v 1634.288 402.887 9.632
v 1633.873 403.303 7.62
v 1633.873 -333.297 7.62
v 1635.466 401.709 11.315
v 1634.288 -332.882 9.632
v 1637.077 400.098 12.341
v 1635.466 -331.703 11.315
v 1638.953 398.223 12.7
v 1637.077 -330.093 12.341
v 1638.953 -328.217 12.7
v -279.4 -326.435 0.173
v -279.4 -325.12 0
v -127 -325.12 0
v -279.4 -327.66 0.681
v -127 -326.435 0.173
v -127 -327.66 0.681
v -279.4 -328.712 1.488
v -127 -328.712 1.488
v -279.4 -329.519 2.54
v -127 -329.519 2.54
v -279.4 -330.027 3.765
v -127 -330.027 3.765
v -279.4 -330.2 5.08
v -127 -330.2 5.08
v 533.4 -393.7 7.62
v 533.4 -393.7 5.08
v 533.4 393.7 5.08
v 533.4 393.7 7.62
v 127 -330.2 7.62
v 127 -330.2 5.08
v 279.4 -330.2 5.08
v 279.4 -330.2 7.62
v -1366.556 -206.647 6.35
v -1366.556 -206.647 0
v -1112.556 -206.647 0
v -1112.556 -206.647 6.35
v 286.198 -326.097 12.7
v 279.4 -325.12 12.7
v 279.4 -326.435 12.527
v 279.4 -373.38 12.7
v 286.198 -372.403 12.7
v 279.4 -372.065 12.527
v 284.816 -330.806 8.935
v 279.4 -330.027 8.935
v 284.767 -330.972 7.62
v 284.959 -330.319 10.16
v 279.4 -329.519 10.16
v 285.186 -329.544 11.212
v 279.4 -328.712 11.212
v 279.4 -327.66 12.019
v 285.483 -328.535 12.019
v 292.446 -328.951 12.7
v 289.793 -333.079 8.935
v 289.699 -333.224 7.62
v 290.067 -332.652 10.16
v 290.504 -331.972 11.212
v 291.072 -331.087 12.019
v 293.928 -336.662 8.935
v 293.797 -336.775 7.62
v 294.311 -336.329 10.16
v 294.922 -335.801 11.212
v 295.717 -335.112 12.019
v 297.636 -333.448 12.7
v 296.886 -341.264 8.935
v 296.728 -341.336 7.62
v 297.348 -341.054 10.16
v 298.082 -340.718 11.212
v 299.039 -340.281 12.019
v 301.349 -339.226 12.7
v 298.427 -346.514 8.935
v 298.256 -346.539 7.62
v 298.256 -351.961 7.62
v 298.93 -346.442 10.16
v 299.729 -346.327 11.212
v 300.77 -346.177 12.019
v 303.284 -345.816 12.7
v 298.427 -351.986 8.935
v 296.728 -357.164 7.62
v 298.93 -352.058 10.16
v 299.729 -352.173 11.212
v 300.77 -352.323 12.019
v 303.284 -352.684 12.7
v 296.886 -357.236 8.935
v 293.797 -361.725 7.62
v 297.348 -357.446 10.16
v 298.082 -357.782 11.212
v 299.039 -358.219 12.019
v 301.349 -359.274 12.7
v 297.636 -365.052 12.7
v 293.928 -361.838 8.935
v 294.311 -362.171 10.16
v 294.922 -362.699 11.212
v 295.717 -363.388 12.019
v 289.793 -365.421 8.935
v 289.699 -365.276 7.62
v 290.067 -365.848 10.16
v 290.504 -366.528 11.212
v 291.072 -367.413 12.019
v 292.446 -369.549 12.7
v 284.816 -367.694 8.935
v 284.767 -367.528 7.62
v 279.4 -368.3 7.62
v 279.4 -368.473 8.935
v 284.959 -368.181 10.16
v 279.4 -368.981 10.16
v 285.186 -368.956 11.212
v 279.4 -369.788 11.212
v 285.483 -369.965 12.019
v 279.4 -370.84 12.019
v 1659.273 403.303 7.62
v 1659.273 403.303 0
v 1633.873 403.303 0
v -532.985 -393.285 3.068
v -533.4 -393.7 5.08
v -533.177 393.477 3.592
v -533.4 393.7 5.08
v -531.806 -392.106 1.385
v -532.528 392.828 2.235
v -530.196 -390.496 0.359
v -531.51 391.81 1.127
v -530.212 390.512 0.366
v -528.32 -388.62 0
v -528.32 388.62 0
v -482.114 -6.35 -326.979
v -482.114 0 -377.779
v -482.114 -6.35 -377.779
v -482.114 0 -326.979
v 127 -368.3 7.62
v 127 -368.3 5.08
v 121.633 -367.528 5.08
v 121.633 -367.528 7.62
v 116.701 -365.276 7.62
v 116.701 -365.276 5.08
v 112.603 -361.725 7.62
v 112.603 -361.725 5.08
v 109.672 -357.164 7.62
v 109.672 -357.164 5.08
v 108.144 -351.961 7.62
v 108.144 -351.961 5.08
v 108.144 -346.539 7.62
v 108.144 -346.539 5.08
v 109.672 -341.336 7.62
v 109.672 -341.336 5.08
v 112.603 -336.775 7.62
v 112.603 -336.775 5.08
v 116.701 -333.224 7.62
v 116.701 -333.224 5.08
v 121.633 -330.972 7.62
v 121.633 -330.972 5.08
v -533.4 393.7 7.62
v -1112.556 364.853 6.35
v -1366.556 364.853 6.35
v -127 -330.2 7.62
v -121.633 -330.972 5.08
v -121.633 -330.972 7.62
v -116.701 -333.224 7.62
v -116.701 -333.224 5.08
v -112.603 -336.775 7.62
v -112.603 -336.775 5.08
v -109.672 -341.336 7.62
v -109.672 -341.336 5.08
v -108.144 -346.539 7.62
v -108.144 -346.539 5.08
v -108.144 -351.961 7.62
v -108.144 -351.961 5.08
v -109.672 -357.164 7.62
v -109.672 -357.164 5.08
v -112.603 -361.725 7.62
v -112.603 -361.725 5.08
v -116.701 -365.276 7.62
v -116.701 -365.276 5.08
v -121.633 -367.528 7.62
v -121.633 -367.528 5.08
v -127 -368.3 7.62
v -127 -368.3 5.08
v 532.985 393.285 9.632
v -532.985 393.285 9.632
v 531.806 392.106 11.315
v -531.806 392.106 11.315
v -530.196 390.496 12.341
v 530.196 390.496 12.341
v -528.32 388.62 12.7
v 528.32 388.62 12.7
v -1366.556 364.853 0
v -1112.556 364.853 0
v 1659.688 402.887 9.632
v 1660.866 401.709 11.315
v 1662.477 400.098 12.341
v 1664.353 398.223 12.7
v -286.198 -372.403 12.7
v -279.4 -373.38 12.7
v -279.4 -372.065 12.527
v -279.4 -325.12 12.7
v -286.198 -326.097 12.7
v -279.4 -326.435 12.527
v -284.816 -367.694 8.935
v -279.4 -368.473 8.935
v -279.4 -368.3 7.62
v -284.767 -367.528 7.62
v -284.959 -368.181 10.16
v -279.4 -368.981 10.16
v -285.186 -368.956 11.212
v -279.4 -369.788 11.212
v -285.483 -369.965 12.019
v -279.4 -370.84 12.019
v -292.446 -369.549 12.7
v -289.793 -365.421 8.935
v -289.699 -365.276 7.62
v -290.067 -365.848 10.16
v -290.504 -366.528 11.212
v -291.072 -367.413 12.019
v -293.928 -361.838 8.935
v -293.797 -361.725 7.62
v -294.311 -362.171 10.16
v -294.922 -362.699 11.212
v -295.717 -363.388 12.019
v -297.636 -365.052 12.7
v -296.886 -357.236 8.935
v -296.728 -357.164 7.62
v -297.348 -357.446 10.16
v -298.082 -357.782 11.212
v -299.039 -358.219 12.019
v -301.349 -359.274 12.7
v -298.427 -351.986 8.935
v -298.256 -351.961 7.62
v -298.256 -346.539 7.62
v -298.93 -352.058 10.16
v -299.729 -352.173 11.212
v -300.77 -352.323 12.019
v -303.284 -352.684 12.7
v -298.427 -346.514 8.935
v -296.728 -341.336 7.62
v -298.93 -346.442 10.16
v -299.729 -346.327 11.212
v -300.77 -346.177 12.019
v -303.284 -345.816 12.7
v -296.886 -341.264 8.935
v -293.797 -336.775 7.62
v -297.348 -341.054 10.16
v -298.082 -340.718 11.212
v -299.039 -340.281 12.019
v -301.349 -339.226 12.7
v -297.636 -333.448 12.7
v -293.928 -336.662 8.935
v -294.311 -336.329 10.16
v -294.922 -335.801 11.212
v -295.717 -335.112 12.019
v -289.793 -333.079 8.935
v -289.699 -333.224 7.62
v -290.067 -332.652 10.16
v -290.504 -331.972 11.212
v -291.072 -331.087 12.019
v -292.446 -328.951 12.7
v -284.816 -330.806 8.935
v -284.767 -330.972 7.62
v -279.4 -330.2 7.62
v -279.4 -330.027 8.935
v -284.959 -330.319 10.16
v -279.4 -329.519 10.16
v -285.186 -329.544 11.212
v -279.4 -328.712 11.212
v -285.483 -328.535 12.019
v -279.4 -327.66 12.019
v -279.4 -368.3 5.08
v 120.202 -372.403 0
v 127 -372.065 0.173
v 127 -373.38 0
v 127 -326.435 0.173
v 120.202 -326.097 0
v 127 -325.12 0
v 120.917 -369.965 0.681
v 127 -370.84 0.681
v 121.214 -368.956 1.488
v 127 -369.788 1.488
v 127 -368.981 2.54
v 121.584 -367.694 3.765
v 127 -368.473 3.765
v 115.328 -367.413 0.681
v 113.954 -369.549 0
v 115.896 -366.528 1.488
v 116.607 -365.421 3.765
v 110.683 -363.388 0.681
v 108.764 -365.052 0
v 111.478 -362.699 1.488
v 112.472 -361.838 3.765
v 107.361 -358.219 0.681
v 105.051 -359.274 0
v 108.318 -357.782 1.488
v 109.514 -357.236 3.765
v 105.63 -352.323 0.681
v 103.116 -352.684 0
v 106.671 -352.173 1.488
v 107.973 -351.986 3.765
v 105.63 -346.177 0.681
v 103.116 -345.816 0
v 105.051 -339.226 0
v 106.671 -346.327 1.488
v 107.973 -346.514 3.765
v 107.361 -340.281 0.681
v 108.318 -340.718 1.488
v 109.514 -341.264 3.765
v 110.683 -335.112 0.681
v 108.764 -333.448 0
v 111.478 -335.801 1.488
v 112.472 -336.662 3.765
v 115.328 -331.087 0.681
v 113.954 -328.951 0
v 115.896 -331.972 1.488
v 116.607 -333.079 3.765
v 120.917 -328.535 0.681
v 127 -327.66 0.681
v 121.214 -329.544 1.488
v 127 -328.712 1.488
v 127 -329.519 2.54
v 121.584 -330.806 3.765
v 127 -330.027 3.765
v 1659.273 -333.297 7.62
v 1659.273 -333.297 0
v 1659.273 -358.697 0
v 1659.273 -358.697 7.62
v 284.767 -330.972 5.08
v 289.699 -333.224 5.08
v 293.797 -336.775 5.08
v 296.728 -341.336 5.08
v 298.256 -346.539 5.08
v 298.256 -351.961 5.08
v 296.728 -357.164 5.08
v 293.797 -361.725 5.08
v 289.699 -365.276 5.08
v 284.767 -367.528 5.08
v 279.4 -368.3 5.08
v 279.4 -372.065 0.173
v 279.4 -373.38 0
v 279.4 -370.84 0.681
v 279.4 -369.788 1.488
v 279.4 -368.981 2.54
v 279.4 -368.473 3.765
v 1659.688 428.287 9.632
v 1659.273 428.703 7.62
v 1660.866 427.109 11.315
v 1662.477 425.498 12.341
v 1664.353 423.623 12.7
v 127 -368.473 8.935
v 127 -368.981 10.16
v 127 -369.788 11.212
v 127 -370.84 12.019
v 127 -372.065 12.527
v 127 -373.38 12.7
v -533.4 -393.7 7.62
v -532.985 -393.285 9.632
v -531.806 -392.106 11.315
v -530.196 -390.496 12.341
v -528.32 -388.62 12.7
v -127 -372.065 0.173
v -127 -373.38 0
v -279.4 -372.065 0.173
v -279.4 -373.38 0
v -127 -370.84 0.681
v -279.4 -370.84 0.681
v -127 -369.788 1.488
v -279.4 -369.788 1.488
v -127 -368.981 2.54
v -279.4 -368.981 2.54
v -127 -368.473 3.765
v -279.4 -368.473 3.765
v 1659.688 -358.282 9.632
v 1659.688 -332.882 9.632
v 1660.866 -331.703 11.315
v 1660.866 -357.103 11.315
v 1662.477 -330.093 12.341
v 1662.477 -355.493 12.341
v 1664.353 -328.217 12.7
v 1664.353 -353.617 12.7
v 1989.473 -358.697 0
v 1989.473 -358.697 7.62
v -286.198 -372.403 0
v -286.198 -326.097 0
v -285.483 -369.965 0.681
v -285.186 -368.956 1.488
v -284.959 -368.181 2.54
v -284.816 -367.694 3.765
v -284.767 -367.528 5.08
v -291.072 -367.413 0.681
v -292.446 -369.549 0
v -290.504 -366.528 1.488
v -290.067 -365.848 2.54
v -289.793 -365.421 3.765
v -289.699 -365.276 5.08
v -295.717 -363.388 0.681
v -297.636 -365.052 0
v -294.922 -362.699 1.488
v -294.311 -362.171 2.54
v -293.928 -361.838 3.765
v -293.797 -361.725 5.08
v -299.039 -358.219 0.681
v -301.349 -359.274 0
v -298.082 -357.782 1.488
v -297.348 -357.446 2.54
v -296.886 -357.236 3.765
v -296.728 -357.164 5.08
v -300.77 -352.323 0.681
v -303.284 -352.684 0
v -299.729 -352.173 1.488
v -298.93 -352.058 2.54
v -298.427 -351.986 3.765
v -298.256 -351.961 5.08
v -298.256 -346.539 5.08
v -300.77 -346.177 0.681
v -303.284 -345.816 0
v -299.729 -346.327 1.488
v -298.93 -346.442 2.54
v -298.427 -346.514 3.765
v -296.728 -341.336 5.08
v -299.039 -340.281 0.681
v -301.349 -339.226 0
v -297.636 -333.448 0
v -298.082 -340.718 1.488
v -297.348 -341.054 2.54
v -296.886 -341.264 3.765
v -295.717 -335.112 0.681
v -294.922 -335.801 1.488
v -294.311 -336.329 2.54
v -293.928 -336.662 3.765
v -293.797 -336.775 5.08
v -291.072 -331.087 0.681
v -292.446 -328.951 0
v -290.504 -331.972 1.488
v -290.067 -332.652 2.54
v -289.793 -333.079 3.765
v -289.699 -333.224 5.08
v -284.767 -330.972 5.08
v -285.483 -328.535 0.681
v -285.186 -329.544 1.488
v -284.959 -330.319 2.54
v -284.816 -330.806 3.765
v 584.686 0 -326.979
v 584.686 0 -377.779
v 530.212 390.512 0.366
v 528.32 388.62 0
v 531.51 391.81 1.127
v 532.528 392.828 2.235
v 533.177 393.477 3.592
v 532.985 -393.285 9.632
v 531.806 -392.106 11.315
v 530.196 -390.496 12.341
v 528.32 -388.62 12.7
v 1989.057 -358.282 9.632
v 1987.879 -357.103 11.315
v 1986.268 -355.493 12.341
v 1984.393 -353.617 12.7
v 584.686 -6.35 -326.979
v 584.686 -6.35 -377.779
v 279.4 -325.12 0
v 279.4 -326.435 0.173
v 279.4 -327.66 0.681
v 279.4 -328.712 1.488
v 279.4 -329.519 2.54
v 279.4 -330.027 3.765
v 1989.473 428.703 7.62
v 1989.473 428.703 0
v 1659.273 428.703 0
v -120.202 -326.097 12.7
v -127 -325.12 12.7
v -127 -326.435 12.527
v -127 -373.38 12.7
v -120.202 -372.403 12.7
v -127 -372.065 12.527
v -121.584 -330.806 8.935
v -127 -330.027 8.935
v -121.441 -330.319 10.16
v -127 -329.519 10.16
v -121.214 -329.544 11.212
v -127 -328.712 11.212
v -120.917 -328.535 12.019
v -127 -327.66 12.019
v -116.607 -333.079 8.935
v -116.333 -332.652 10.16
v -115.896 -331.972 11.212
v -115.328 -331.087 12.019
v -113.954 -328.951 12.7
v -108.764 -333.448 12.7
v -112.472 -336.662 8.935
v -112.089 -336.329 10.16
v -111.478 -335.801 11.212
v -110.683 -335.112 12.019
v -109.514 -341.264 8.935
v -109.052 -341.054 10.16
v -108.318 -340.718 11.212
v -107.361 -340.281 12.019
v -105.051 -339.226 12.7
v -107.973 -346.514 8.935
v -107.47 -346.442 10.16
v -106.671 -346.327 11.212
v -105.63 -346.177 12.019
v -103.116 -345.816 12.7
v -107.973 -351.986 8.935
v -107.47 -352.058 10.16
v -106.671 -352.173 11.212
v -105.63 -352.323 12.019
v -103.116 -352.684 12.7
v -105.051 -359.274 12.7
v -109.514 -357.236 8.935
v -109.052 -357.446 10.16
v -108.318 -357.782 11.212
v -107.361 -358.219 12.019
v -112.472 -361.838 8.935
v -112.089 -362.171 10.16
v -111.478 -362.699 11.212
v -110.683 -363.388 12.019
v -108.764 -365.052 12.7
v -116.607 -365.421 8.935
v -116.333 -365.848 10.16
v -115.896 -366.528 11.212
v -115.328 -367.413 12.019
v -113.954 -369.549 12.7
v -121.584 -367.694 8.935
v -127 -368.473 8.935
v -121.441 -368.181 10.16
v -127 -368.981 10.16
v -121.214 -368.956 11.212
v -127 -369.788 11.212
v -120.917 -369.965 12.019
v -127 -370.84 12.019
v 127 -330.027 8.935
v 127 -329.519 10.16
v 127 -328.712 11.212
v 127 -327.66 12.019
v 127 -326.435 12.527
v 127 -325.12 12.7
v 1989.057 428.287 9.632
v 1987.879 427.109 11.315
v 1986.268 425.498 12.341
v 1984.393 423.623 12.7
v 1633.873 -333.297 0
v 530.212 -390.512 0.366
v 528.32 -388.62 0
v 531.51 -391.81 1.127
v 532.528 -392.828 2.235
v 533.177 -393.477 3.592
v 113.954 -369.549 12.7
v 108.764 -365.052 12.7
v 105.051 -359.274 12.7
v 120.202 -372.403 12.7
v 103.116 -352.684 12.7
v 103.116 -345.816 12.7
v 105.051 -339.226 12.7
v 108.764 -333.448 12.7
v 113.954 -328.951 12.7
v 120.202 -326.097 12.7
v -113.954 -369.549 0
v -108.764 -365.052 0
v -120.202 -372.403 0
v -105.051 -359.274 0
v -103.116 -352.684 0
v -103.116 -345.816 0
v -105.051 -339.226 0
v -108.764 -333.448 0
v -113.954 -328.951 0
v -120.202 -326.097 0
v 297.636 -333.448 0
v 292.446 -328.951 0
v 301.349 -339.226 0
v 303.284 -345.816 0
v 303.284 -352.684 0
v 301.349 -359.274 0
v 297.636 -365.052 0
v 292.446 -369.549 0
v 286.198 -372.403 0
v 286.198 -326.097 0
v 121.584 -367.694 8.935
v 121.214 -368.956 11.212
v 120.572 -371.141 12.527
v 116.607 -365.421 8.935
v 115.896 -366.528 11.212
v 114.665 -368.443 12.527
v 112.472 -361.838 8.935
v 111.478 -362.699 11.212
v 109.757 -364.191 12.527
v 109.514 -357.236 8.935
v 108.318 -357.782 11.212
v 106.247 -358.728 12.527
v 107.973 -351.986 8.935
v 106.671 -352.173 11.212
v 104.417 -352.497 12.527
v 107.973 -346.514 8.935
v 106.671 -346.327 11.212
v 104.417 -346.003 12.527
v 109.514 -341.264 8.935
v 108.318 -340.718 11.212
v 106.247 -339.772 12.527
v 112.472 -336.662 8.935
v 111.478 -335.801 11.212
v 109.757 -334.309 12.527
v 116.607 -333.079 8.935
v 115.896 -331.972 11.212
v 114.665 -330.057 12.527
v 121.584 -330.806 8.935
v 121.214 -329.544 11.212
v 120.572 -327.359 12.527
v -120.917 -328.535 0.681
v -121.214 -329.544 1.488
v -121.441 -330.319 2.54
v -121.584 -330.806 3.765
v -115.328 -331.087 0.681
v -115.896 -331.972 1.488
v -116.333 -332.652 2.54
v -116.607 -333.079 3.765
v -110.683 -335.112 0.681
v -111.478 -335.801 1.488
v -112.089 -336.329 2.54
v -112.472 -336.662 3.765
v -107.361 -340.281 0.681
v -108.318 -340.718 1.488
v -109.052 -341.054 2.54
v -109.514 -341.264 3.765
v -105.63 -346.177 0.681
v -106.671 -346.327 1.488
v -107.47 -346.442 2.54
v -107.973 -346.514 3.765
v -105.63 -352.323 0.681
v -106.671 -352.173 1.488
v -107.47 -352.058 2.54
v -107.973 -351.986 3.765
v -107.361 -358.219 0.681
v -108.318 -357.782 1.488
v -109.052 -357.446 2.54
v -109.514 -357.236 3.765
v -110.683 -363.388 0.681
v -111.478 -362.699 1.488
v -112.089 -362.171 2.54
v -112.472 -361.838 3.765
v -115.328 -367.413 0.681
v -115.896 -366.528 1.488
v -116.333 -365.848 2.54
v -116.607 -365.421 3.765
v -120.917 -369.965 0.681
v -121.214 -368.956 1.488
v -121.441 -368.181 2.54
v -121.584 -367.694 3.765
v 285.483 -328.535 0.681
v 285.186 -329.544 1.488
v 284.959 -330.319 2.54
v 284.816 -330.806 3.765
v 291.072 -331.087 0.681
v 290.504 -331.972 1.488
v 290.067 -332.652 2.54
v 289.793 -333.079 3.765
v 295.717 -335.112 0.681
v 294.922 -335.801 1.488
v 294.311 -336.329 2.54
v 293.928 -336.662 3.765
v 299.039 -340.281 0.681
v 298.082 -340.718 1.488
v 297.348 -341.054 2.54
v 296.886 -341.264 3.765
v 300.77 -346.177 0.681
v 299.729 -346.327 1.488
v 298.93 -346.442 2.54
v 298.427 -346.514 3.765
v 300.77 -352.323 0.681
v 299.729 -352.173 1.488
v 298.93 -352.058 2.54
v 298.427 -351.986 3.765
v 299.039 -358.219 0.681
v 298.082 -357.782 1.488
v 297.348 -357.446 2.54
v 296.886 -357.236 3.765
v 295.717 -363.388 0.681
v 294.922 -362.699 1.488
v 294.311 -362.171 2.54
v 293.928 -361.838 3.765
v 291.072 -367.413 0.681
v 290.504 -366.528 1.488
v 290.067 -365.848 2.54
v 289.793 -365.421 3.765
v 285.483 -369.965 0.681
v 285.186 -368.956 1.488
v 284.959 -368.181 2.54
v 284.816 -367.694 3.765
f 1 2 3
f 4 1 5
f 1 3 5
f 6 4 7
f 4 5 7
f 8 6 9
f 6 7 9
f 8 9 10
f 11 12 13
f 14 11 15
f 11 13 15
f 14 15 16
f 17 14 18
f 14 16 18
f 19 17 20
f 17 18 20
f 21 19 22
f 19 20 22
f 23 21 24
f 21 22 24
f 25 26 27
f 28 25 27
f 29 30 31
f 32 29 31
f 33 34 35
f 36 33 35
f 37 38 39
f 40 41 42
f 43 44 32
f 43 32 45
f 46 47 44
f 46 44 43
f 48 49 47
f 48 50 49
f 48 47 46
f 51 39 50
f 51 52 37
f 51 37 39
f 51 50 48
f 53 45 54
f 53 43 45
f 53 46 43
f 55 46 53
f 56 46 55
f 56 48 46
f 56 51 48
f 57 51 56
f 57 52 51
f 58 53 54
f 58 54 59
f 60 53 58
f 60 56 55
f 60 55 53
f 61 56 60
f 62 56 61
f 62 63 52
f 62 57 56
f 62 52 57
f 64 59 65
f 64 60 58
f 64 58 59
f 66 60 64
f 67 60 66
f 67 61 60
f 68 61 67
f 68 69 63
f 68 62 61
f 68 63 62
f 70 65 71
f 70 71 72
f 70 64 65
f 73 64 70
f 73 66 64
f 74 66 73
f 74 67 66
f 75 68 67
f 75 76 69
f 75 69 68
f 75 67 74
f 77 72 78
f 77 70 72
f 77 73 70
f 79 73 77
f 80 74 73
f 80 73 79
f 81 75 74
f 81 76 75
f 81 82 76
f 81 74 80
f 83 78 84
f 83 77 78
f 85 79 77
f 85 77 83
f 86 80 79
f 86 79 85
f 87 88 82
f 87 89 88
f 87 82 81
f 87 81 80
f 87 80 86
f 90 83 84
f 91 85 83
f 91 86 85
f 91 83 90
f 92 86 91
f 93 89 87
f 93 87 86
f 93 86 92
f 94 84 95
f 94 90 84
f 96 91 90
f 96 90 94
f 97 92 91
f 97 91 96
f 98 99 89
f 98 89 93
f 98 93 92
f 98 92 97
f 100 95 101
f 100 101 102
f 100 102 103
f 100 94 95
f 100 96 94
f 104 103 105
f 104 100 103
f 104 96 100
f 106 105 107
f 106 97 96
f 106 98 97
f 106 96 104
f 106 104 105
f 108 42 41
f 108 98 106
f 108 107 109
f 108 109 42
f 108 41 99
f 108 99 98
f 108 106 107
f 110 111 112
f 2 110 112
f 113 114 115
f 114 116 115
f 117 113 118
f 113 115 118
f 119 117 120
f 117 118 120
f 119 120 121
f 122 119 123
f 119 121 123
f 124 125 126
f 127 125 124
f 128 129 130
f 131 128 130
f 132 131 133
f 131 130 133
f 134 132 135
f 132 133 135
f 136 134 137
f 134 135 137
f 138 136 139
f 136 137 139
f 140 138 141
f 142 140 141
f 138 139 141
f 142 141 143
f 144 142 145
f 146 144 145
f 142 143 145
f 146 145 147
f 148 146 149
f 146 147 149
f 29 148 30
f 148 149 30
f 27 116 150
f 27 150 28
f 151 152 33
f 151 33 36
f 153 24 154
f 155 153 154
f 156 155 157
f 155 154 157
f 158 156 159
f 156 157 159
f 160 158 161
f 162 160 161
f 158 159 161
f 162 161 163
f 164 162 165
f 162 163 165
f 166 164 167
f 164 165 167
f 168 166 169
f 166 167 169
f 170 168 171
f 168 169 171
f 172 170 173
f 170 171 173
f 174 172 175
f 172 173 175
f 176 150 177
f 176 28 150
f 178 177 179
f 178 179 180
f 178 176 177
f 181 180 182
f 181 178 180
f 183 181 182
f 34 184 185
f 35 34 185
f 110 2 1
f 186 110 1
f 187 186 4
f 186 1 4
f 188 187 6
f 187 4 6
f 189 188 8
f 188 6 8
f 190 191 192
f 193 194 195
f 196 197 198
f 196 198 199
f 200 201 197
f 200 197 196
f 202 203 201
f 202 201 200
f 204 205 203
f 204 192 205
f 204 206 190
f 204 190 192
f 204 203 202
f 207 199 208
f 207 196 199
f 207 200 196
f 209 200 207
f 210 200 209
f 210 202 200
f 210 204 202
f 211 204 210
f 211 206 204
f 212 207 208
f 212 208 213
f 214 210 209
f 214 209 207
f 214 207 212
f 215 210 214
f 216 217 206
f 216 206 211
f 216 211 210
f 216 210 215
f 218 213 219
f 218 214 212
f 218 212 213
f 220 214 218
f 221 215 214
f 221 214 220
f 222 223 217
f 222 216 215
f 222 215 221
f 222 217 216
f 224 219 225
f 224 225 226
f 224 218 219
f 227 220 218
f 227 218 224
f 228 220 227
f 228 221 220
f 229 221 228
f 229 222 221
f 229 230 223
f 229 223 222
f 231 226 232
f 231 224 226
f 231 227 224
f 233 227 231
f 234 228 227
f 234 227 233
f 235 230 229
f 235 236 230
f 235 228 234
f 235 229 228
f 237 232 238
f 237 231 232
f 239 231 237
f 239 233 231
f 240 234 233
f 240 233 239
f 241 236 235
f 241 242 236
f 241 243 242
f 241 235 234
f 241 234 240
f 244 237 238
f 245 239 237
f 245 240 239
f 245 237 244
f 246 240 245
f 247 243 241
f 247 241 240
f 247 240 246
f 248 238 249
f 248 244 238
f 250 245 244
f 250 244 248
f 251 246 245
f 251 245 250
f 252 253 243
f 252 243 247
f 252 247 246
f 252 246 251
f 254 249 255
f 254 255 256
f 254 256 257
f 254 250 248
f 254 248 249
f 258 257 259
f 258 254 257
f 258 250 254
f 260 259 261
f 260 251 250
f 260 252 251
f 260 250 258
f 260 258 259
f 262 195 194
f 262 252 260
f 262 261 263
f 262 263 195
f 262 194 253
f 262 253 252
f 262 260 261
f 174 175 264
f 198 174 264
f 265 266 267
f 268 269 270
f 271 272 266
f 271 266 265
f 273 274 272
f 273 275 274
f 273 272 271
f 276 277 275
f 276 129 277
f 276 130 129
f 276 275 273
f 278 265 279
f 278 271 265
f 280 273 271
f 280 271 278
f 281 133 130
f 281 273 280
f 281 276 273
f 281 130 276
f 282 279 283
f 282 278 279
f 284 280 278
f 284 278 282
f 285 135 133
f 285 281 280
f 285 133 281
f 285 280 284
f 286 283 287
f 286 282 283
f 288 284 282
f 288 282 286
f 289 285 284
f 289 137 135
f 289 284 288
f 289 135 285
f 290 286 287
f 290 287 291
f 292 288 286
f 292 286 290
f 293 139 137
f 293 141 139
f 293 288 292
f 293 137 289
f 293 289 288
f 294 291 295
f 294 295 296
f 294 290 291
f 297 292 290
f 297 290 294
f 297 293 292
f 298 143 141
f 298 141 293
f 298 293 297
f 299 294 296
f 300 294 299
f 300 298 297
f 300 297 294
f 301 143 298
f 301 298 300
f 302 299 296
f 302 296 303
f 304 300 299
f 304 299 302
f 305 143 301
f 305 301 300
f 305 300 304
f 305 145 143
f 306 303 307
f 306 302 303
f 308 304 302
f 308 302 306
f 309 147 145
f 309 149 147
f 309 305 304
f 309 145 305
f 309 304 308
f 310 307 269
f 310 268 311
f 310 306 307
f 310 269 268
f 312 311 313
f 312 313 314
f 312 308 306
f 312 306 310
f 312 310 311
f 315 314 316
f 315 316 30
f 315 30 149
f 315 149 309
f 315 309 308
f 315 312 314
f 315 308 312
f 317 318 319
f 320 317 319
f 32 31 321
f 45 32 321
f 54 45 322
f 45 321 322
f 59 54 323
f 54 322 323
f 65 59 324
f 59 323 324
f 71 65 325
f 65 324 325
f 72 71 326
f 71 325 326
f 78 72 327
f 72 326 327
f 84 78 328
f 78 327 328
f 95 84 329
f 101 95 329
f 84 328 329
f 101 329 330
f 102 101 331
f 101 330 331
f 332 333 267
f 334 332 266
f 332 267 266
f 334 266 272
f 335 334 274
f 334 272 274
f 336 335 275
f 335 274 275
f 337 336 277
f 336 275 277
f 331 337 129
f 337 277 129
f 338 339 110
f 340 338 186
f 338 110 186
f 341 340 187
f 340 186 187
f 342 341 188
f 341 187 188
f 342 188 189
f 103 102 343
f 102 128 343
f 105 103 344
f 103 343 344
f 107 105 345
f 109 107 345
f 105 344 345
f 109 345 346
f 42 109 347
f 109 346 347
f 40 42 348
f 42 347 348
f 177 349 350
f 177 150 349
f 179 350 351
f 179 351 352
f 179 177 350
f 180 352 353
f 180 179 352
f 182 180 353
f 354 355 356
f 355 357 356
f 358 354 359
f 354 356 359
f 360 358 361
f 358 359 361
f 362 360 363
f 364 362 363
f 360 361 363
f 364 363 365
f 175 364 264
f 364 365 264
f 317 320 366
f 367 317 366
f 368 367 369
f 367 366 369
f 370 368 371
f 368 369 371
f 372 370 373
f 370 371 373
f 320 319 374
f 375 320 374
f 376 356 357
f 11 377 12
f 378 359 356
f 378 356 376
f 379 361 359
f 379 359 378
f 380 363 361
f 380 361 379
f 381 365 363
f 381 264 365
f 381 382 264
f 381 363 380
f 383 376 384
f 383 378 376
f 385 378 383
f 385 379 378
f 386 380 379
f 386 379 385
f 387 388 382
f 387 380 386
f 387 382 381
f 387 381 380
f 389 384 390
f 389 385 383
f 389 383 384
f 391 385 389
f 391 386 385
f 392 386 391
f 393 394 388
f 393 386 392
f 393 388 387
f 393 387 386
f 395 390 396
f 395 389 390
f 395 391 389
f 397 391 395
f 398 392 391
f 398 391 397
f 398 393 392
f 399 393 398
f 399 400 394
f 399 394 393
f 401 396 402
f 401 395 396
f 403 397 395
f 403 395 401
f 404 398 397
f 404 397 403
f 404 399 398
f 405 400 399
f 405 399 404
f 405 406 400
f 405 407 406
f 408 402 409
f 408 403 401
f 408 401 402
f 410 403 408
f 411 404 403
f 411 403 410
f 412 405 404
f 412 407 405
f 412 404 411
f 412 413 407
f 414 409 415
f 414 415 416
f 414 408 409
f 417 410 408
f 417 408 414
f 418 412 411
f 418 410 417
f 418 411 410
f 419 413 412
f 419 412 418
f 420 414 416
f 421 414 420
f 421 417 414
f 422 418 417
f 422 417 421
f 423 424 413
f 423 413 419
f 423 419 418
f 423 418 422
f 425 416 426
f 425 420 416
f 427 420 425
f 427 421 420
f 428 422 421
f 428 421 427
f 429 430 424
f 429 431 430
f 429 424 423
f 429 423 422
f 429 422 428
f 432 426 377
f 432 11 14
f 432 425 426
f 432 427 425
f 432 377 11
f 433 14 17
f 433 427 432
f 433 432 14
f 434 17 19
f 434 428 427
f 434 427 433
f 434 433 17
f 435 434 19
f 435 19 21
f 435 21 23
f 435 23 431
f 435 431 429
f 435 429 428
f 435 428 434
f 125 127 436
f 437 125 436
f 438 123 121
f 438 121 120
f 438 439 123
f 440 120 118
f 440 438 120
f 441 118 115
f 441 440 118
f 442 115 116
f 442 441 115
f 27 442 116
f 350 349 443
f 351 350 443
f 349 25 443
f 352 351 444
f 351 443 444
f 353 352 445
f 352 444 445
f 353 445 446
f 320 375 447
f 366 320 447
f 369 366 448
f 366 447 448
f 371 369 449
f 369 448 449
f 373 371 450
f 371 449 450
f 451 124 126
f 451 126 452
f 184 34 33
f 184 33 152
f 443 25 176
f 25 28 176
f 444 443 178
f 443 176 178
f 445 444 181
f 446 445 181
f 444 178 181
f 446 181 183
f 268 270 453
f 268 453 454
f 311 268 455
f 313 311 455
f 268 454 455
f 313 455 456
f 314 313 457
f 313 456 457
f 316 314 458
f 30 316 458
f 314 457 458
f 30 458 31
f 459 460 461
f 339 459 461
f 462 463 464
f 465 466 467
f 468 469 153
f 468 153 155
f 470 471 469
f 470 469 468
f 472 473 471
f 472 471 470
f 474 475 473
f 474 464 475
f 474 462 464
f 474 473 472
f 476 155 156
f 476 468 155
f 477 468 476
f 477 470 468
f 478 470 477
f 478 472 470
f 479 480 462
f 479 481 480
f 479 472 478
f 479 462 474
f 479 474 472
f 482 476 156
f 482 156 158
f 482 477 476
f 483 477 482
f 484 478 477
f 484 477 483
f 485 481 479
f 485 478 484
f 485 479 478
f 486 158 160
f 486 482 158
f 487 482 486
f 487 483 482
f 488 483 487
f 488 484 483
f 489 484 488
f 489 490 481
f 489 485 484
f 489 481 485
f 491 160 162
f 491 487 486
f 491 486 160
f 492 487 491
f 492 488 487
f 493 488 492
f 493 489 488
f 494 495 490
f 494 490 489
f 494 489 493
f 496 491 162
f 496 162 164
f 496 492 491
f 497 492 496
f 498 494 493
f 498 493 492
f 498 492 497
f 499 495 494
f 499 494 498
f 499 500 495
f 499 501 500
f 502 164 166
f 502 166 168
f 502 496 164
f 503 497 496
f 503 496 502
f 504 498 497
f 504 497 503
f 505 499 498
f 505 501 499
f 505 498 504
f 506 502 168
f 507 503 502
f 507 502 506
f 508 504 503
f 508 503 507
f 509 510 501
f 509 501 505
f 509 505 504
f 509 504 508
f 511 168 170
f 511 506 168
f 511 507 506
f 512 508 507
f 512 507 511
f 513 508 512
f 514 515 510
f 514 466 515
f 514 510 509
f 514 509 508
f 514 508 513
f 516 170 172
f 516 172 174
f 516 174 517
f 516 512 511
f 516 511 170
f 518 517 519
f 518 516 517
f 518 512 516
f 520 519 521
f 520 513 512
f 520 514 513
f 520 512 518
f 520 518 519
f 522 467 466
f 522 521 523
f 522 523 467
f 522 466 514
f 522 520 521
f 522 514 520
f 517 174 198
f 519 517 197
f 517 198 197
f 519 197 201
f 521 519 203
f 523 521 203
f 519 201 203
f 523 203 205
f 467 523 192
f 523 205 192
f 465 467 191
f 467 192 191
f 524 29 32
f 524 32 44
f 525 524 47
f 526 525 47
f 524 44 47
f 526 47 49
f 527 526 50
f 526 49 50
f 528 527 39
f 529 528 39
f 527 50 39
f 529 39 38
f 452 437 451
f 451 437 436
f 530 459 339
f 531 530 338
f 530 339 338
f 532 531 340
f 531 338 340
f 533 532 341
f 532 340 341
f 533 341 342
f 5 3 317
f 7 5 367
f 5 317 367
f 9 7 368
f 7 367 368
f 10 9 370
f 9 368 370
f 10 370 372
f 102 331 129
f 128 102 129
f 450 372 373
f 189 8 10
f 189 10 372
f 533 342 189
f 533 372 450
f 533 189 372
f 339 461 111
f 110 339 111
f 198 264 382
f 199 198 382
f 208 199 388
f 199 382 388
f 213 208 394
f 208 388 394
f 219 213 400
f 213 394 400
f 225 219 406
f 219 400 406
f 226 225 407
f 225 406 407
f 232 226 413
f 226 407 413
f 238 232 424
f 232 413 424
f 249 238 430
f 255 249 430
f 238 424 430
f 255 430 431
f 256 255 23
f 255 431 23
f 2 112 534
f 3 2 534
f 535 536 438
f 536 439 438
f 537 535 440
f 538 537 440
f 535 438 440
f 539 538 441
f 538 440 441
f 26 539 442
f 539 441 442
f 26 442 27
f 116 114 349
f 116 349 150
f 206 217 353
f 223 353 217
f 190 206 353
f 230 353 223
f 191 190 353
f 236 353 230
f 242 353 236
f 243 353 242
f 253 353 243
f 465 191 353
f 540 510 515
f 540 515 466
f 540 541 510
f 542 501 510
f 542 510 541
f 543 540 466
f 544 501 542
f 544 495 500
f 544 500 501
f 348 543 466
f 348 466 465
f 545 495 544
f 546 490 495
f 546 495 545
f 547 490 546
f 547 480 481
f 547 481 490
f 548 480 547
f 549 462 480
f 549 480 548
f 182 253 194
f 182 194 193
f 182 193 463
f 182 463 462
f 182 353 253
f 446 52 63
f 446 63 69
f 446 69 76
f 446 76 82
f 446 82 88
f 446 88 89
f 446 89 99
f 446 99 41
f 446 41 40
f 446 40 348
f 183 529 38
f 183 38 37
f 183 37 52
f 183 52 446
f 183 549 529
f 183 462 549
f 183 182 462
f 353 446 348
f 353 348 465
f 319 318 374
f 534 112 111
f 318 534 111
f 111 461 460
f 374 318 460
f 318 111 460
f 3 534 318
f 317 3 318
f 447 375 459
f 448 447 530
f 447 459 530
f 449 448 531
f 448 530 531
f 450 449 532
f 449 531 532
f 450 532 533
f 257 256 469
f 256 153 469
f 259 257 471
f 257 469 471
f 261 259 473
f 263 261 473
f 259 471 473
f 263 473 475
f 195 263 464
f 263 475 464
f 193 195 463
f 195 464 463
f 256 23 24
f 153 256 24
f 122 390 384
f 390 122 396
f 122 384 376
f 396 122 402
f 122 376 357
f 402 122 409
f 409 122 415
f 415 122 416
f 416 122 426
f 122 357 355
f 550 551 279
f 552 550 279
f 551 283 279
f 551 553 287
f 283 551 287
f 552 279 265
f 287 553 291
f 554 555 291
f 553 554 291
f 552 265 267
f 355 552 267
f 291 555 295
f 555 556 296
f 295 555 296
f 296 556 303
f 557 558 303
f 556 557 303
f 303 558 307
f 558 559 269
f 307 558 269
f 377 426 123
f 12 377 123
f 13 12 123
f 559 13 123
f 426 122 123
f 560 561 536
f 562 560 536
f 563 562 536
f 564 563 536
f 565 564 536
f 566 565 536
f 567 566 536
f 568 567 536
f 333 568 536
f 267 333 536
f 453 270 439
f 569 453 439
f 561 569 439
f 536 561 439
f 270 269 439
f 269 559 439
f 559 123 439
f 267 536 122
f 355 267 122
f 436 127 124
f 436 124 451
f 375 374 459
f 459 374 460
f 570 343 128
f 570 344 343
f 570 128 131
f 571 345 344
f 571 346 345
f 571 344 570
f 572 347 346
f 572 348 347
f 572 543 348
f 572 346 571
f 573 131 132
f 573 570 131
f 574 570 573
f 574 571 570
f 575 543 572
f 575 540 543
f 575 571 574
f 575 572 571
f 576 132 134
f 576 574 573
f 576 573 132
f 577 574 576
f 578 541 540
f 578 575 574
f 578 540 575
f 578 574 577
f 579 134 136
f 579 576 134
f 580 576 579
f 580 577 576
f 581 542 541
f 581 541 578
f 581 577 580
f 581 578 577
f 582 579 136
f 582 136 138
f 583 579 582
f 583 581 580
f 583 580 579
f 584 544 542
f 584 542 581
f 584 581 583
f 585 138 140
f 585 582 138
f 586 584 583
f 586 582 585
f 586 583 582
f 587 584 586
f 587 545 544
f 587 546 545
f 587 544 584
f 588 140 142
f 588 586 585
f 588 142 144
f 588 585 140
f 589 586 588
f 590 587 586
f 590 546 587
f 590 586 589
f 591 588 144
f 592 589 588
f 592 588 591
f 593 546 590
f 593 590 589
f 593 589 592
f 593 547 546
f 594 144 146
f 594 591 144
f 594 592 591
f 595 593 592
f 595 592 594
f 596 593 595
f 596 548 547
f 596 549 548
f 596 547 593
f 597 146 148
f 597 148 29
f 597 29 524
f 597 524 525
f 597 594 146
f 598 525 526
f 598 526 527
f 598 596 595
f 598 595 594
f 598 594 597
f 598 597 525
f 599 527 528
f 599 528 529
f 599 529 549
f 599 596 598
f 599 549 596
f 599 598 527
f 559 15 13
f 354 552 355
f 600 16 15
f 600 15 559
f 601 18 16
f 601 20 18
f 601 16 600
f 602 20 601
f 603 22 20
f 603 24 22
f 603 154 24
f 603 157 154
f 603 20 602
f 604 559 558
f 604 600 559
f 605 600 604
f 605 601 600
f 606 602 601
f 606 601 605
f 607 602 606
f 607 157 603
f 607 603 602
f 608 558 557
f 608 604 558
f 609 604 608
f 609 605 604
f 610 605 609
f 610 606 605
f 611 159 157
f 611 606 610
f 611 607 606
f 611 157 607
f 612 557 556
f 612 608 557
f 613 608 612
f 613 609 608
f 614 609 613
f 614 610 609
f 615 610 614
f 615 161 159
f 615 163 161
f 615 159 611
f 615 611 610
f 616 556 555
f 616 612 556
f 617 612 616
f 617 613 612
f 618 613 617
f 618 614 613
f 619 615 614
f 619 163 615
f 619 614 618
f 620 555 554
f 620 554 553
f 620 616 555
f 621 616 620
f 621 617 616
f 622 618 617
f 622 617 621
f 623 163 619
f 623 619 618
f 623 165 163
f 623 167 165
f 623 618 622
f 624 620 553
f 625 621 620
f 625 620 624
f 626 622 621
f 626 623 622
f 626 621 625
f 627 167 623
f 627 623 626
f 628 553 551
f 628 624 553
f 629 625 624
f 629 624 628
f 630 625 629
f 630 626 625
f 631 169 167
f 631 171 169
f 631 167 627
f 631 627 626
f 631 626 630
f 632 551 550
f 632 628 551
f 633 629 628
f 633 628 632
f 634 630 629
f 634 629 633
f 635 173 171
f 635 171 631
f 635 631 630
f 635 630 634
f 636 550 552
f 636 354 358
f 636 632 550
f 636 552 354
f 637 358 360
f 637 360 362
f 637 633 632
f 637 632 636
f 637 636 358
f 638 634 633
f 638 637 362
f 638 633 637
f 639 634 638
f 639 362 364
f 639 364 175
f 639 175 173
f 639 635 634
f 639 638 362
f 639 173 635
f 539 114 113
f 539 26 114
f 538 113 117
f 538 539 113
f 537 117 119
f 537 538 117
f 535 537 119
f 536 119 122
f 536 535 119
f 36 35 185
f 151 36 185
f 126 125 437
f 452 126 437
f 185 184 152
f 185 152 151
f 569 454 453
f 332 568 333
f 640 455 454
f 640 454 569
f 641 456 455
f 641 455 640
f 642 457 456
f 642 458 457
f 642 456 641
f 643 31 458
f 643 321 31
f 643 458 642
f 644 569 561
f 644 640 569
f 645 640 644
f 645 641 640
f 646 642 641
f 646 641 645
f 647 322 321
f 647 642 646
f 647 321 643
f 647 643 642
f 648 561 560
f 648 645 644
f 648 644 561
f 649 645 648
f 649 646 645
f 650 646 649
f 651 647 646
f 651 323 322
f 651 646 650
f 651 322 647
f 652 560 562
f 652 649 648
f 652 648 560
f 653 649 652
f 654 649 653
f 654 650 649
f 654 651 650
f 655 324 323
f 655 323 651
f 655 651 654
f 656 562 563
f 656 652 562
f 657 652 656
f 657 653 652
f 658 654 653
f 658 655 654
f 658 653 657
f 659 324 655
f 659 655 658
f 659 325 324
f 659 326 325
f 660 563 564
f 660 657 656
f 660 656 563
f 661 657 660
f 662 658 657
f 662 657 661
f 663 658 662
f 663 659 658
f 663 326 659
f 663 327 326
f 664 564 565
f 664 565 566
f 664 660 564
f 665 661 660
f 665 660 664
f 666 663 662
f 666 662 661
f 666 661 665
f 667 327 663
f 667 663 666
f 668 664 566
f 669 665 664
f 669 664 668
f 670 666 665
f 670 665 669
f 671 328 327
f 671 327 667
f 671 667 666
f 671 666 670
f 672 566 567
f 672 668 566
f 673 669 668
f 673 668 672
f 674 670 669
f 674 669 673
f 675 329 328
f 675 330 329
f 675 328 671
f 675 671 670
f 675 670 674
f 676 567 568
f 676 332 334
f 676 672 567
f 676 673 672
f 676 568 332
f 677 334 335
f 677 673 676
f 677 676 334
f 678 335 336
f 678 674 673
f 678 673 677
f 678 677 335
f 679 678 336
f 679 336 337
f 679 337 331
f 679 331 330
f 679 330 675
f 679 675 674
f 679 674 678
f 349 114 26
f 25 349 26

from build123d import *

# Parameters (mm, degrees)
F0_W      = 1066.8
F0_H      = 787.4
F1_DEPTH  = 12.7
F2_R      = 5.08
F3_R      = 5.08
F4_W      = 1066.8
F4_H      = 50.8
F5_DEPTH  = 6.35
F7_DEPTH  = 12.7
F8_R      = 5.08
F9_W      = 254
F9_H      = 571.5
F10_DEPTH = 6.35


with BuildPart() as f1:
    # F0 (on Top) → F1 (new body)
    with BuildSketch(Plane.XY):
        Rectangle(F0_W, F0_H)
        with BuildLine():
            ThreePointArc((-279.4, -368.3), (-298.45, -349.25), (-279.4, -330.2))
            Line((-279.4, -330.2), (-127, -330.2))
            ThreePointArc((-127, -330.2), (-107.95, -349.25), (-127, -368.3))
            Line((-127, -368.3), (-279.4, -368.3))
        make_face(mode=Mode.SUBTRACT)
        with BuildLine():
            Line((127, -330.2), (279.4, -330.2))
            ThreePointArc((279.4, -330.2), (298.45, -349.25), (279.4, -368.3))
            Line((279.4, -368.3), (127, -368.3))
            ThreePointArc((127, -368.3), (107.95, -349.25), (127, -330.2))
        make_face(mode=Mode.SUBTRACT)
    extrude(amount=F1_DEPTH)

    # F2
    f2_edges = [f1.edges().sort_by_distance(p)[0] for p in [
        (533.4, 0, 12.7),
        (0, 393.7, 12.7),
        (-533.4, 0, 12.7),
        (0, -393.7, 12.7),
        (-298.45, -349.25, 12.7),
        (-203.2, -330.2, 12.7),
        (-107.95, -349.25, 12.7),
        (-203.2, -368.3, 12.7),
        (203.2, -330.2, 12.7),
        (298.45, -349.25, 12.7),
        (203.2, -368.3, 12.7),
        (107.95, -349.25, 12.7),
    ]]
    fillet(f2_edges, radius=F2_R)

    # F3
    f3_edges = [f1.edges().sort_by_distance(p)[0] for p in [
        (533.4, 0, 0),
        (0, 393.7, 0),
        (-533.4, 0, 0),
        (0, -393.7, 0),
        (-298.45, -349.25, 0),
        (-203.2, -330.2, 0),
        (-107.95, -349.25, 0),
        (-203.2, -368.3, 0),
        (203.2, -330.2, 0),
        (298.45, -349.25, 0),
        (203.2, -368.3, 0),
        (107.95, -349.25, 0),
    ]]
    fillet(f3_edges, radius=F3_R)


with BuildPart() as f5:
    # F4 (on Front) → F5 (new body)
    with BuildSketch(Plane.XZ):
        with Locations((51.285564, -352.378918)):
            Rectangle(F4_W, F4_H)
    extrude(amount=F5_DEPTH)


with BuildPart() as f7:
    # F6 (on Top) → F7 (new body)
    with BuildSketch(Plane.XY):
        Polygon((1989.472508, 428.702794), (1659.272508, 428.702794), (1659.272508, 403.302794), (1633.872508, 403.302794), (1633.872508, -333.297206), (1659.272508, -333.297206), (1659.272508, -358.697206), (1989.472508, -358.697206), align=None)
    extrude(amount=F7_DEPTH)

    # F8
    f8_edges = [f7.edges().sort_by_distance(p)[0] for p in [
        (1824.372508, 428.702794, 12.7),
        (1659.272508, 416.002794, 12.7),
        (1646.572508, 403.302794, 12.7),
        (1633.872508, 35.002794, 12.7),
        (1646.572508, -333.297206, 12.7),
        (1659.272508, -345.997206, 12.7),
        (1824.372508, -358.697206, 12.7),
        (1989.472508, 35.002794, 12.7),
    ]]
    fillet(f8_edges, radius=F8_R)


with BuildPart() as f10:
    # F9 (on Top) → F10 (new body)
    with BuildSketch(Plane.XY):
        with Locations((-1239.5561, 79.102664)):
            Rectangle(F9_W, F9_H)
    extrude(amount=F10_DEPTH)


solid = Compound([f1.part, f5.part, f7.part, f10.part])
